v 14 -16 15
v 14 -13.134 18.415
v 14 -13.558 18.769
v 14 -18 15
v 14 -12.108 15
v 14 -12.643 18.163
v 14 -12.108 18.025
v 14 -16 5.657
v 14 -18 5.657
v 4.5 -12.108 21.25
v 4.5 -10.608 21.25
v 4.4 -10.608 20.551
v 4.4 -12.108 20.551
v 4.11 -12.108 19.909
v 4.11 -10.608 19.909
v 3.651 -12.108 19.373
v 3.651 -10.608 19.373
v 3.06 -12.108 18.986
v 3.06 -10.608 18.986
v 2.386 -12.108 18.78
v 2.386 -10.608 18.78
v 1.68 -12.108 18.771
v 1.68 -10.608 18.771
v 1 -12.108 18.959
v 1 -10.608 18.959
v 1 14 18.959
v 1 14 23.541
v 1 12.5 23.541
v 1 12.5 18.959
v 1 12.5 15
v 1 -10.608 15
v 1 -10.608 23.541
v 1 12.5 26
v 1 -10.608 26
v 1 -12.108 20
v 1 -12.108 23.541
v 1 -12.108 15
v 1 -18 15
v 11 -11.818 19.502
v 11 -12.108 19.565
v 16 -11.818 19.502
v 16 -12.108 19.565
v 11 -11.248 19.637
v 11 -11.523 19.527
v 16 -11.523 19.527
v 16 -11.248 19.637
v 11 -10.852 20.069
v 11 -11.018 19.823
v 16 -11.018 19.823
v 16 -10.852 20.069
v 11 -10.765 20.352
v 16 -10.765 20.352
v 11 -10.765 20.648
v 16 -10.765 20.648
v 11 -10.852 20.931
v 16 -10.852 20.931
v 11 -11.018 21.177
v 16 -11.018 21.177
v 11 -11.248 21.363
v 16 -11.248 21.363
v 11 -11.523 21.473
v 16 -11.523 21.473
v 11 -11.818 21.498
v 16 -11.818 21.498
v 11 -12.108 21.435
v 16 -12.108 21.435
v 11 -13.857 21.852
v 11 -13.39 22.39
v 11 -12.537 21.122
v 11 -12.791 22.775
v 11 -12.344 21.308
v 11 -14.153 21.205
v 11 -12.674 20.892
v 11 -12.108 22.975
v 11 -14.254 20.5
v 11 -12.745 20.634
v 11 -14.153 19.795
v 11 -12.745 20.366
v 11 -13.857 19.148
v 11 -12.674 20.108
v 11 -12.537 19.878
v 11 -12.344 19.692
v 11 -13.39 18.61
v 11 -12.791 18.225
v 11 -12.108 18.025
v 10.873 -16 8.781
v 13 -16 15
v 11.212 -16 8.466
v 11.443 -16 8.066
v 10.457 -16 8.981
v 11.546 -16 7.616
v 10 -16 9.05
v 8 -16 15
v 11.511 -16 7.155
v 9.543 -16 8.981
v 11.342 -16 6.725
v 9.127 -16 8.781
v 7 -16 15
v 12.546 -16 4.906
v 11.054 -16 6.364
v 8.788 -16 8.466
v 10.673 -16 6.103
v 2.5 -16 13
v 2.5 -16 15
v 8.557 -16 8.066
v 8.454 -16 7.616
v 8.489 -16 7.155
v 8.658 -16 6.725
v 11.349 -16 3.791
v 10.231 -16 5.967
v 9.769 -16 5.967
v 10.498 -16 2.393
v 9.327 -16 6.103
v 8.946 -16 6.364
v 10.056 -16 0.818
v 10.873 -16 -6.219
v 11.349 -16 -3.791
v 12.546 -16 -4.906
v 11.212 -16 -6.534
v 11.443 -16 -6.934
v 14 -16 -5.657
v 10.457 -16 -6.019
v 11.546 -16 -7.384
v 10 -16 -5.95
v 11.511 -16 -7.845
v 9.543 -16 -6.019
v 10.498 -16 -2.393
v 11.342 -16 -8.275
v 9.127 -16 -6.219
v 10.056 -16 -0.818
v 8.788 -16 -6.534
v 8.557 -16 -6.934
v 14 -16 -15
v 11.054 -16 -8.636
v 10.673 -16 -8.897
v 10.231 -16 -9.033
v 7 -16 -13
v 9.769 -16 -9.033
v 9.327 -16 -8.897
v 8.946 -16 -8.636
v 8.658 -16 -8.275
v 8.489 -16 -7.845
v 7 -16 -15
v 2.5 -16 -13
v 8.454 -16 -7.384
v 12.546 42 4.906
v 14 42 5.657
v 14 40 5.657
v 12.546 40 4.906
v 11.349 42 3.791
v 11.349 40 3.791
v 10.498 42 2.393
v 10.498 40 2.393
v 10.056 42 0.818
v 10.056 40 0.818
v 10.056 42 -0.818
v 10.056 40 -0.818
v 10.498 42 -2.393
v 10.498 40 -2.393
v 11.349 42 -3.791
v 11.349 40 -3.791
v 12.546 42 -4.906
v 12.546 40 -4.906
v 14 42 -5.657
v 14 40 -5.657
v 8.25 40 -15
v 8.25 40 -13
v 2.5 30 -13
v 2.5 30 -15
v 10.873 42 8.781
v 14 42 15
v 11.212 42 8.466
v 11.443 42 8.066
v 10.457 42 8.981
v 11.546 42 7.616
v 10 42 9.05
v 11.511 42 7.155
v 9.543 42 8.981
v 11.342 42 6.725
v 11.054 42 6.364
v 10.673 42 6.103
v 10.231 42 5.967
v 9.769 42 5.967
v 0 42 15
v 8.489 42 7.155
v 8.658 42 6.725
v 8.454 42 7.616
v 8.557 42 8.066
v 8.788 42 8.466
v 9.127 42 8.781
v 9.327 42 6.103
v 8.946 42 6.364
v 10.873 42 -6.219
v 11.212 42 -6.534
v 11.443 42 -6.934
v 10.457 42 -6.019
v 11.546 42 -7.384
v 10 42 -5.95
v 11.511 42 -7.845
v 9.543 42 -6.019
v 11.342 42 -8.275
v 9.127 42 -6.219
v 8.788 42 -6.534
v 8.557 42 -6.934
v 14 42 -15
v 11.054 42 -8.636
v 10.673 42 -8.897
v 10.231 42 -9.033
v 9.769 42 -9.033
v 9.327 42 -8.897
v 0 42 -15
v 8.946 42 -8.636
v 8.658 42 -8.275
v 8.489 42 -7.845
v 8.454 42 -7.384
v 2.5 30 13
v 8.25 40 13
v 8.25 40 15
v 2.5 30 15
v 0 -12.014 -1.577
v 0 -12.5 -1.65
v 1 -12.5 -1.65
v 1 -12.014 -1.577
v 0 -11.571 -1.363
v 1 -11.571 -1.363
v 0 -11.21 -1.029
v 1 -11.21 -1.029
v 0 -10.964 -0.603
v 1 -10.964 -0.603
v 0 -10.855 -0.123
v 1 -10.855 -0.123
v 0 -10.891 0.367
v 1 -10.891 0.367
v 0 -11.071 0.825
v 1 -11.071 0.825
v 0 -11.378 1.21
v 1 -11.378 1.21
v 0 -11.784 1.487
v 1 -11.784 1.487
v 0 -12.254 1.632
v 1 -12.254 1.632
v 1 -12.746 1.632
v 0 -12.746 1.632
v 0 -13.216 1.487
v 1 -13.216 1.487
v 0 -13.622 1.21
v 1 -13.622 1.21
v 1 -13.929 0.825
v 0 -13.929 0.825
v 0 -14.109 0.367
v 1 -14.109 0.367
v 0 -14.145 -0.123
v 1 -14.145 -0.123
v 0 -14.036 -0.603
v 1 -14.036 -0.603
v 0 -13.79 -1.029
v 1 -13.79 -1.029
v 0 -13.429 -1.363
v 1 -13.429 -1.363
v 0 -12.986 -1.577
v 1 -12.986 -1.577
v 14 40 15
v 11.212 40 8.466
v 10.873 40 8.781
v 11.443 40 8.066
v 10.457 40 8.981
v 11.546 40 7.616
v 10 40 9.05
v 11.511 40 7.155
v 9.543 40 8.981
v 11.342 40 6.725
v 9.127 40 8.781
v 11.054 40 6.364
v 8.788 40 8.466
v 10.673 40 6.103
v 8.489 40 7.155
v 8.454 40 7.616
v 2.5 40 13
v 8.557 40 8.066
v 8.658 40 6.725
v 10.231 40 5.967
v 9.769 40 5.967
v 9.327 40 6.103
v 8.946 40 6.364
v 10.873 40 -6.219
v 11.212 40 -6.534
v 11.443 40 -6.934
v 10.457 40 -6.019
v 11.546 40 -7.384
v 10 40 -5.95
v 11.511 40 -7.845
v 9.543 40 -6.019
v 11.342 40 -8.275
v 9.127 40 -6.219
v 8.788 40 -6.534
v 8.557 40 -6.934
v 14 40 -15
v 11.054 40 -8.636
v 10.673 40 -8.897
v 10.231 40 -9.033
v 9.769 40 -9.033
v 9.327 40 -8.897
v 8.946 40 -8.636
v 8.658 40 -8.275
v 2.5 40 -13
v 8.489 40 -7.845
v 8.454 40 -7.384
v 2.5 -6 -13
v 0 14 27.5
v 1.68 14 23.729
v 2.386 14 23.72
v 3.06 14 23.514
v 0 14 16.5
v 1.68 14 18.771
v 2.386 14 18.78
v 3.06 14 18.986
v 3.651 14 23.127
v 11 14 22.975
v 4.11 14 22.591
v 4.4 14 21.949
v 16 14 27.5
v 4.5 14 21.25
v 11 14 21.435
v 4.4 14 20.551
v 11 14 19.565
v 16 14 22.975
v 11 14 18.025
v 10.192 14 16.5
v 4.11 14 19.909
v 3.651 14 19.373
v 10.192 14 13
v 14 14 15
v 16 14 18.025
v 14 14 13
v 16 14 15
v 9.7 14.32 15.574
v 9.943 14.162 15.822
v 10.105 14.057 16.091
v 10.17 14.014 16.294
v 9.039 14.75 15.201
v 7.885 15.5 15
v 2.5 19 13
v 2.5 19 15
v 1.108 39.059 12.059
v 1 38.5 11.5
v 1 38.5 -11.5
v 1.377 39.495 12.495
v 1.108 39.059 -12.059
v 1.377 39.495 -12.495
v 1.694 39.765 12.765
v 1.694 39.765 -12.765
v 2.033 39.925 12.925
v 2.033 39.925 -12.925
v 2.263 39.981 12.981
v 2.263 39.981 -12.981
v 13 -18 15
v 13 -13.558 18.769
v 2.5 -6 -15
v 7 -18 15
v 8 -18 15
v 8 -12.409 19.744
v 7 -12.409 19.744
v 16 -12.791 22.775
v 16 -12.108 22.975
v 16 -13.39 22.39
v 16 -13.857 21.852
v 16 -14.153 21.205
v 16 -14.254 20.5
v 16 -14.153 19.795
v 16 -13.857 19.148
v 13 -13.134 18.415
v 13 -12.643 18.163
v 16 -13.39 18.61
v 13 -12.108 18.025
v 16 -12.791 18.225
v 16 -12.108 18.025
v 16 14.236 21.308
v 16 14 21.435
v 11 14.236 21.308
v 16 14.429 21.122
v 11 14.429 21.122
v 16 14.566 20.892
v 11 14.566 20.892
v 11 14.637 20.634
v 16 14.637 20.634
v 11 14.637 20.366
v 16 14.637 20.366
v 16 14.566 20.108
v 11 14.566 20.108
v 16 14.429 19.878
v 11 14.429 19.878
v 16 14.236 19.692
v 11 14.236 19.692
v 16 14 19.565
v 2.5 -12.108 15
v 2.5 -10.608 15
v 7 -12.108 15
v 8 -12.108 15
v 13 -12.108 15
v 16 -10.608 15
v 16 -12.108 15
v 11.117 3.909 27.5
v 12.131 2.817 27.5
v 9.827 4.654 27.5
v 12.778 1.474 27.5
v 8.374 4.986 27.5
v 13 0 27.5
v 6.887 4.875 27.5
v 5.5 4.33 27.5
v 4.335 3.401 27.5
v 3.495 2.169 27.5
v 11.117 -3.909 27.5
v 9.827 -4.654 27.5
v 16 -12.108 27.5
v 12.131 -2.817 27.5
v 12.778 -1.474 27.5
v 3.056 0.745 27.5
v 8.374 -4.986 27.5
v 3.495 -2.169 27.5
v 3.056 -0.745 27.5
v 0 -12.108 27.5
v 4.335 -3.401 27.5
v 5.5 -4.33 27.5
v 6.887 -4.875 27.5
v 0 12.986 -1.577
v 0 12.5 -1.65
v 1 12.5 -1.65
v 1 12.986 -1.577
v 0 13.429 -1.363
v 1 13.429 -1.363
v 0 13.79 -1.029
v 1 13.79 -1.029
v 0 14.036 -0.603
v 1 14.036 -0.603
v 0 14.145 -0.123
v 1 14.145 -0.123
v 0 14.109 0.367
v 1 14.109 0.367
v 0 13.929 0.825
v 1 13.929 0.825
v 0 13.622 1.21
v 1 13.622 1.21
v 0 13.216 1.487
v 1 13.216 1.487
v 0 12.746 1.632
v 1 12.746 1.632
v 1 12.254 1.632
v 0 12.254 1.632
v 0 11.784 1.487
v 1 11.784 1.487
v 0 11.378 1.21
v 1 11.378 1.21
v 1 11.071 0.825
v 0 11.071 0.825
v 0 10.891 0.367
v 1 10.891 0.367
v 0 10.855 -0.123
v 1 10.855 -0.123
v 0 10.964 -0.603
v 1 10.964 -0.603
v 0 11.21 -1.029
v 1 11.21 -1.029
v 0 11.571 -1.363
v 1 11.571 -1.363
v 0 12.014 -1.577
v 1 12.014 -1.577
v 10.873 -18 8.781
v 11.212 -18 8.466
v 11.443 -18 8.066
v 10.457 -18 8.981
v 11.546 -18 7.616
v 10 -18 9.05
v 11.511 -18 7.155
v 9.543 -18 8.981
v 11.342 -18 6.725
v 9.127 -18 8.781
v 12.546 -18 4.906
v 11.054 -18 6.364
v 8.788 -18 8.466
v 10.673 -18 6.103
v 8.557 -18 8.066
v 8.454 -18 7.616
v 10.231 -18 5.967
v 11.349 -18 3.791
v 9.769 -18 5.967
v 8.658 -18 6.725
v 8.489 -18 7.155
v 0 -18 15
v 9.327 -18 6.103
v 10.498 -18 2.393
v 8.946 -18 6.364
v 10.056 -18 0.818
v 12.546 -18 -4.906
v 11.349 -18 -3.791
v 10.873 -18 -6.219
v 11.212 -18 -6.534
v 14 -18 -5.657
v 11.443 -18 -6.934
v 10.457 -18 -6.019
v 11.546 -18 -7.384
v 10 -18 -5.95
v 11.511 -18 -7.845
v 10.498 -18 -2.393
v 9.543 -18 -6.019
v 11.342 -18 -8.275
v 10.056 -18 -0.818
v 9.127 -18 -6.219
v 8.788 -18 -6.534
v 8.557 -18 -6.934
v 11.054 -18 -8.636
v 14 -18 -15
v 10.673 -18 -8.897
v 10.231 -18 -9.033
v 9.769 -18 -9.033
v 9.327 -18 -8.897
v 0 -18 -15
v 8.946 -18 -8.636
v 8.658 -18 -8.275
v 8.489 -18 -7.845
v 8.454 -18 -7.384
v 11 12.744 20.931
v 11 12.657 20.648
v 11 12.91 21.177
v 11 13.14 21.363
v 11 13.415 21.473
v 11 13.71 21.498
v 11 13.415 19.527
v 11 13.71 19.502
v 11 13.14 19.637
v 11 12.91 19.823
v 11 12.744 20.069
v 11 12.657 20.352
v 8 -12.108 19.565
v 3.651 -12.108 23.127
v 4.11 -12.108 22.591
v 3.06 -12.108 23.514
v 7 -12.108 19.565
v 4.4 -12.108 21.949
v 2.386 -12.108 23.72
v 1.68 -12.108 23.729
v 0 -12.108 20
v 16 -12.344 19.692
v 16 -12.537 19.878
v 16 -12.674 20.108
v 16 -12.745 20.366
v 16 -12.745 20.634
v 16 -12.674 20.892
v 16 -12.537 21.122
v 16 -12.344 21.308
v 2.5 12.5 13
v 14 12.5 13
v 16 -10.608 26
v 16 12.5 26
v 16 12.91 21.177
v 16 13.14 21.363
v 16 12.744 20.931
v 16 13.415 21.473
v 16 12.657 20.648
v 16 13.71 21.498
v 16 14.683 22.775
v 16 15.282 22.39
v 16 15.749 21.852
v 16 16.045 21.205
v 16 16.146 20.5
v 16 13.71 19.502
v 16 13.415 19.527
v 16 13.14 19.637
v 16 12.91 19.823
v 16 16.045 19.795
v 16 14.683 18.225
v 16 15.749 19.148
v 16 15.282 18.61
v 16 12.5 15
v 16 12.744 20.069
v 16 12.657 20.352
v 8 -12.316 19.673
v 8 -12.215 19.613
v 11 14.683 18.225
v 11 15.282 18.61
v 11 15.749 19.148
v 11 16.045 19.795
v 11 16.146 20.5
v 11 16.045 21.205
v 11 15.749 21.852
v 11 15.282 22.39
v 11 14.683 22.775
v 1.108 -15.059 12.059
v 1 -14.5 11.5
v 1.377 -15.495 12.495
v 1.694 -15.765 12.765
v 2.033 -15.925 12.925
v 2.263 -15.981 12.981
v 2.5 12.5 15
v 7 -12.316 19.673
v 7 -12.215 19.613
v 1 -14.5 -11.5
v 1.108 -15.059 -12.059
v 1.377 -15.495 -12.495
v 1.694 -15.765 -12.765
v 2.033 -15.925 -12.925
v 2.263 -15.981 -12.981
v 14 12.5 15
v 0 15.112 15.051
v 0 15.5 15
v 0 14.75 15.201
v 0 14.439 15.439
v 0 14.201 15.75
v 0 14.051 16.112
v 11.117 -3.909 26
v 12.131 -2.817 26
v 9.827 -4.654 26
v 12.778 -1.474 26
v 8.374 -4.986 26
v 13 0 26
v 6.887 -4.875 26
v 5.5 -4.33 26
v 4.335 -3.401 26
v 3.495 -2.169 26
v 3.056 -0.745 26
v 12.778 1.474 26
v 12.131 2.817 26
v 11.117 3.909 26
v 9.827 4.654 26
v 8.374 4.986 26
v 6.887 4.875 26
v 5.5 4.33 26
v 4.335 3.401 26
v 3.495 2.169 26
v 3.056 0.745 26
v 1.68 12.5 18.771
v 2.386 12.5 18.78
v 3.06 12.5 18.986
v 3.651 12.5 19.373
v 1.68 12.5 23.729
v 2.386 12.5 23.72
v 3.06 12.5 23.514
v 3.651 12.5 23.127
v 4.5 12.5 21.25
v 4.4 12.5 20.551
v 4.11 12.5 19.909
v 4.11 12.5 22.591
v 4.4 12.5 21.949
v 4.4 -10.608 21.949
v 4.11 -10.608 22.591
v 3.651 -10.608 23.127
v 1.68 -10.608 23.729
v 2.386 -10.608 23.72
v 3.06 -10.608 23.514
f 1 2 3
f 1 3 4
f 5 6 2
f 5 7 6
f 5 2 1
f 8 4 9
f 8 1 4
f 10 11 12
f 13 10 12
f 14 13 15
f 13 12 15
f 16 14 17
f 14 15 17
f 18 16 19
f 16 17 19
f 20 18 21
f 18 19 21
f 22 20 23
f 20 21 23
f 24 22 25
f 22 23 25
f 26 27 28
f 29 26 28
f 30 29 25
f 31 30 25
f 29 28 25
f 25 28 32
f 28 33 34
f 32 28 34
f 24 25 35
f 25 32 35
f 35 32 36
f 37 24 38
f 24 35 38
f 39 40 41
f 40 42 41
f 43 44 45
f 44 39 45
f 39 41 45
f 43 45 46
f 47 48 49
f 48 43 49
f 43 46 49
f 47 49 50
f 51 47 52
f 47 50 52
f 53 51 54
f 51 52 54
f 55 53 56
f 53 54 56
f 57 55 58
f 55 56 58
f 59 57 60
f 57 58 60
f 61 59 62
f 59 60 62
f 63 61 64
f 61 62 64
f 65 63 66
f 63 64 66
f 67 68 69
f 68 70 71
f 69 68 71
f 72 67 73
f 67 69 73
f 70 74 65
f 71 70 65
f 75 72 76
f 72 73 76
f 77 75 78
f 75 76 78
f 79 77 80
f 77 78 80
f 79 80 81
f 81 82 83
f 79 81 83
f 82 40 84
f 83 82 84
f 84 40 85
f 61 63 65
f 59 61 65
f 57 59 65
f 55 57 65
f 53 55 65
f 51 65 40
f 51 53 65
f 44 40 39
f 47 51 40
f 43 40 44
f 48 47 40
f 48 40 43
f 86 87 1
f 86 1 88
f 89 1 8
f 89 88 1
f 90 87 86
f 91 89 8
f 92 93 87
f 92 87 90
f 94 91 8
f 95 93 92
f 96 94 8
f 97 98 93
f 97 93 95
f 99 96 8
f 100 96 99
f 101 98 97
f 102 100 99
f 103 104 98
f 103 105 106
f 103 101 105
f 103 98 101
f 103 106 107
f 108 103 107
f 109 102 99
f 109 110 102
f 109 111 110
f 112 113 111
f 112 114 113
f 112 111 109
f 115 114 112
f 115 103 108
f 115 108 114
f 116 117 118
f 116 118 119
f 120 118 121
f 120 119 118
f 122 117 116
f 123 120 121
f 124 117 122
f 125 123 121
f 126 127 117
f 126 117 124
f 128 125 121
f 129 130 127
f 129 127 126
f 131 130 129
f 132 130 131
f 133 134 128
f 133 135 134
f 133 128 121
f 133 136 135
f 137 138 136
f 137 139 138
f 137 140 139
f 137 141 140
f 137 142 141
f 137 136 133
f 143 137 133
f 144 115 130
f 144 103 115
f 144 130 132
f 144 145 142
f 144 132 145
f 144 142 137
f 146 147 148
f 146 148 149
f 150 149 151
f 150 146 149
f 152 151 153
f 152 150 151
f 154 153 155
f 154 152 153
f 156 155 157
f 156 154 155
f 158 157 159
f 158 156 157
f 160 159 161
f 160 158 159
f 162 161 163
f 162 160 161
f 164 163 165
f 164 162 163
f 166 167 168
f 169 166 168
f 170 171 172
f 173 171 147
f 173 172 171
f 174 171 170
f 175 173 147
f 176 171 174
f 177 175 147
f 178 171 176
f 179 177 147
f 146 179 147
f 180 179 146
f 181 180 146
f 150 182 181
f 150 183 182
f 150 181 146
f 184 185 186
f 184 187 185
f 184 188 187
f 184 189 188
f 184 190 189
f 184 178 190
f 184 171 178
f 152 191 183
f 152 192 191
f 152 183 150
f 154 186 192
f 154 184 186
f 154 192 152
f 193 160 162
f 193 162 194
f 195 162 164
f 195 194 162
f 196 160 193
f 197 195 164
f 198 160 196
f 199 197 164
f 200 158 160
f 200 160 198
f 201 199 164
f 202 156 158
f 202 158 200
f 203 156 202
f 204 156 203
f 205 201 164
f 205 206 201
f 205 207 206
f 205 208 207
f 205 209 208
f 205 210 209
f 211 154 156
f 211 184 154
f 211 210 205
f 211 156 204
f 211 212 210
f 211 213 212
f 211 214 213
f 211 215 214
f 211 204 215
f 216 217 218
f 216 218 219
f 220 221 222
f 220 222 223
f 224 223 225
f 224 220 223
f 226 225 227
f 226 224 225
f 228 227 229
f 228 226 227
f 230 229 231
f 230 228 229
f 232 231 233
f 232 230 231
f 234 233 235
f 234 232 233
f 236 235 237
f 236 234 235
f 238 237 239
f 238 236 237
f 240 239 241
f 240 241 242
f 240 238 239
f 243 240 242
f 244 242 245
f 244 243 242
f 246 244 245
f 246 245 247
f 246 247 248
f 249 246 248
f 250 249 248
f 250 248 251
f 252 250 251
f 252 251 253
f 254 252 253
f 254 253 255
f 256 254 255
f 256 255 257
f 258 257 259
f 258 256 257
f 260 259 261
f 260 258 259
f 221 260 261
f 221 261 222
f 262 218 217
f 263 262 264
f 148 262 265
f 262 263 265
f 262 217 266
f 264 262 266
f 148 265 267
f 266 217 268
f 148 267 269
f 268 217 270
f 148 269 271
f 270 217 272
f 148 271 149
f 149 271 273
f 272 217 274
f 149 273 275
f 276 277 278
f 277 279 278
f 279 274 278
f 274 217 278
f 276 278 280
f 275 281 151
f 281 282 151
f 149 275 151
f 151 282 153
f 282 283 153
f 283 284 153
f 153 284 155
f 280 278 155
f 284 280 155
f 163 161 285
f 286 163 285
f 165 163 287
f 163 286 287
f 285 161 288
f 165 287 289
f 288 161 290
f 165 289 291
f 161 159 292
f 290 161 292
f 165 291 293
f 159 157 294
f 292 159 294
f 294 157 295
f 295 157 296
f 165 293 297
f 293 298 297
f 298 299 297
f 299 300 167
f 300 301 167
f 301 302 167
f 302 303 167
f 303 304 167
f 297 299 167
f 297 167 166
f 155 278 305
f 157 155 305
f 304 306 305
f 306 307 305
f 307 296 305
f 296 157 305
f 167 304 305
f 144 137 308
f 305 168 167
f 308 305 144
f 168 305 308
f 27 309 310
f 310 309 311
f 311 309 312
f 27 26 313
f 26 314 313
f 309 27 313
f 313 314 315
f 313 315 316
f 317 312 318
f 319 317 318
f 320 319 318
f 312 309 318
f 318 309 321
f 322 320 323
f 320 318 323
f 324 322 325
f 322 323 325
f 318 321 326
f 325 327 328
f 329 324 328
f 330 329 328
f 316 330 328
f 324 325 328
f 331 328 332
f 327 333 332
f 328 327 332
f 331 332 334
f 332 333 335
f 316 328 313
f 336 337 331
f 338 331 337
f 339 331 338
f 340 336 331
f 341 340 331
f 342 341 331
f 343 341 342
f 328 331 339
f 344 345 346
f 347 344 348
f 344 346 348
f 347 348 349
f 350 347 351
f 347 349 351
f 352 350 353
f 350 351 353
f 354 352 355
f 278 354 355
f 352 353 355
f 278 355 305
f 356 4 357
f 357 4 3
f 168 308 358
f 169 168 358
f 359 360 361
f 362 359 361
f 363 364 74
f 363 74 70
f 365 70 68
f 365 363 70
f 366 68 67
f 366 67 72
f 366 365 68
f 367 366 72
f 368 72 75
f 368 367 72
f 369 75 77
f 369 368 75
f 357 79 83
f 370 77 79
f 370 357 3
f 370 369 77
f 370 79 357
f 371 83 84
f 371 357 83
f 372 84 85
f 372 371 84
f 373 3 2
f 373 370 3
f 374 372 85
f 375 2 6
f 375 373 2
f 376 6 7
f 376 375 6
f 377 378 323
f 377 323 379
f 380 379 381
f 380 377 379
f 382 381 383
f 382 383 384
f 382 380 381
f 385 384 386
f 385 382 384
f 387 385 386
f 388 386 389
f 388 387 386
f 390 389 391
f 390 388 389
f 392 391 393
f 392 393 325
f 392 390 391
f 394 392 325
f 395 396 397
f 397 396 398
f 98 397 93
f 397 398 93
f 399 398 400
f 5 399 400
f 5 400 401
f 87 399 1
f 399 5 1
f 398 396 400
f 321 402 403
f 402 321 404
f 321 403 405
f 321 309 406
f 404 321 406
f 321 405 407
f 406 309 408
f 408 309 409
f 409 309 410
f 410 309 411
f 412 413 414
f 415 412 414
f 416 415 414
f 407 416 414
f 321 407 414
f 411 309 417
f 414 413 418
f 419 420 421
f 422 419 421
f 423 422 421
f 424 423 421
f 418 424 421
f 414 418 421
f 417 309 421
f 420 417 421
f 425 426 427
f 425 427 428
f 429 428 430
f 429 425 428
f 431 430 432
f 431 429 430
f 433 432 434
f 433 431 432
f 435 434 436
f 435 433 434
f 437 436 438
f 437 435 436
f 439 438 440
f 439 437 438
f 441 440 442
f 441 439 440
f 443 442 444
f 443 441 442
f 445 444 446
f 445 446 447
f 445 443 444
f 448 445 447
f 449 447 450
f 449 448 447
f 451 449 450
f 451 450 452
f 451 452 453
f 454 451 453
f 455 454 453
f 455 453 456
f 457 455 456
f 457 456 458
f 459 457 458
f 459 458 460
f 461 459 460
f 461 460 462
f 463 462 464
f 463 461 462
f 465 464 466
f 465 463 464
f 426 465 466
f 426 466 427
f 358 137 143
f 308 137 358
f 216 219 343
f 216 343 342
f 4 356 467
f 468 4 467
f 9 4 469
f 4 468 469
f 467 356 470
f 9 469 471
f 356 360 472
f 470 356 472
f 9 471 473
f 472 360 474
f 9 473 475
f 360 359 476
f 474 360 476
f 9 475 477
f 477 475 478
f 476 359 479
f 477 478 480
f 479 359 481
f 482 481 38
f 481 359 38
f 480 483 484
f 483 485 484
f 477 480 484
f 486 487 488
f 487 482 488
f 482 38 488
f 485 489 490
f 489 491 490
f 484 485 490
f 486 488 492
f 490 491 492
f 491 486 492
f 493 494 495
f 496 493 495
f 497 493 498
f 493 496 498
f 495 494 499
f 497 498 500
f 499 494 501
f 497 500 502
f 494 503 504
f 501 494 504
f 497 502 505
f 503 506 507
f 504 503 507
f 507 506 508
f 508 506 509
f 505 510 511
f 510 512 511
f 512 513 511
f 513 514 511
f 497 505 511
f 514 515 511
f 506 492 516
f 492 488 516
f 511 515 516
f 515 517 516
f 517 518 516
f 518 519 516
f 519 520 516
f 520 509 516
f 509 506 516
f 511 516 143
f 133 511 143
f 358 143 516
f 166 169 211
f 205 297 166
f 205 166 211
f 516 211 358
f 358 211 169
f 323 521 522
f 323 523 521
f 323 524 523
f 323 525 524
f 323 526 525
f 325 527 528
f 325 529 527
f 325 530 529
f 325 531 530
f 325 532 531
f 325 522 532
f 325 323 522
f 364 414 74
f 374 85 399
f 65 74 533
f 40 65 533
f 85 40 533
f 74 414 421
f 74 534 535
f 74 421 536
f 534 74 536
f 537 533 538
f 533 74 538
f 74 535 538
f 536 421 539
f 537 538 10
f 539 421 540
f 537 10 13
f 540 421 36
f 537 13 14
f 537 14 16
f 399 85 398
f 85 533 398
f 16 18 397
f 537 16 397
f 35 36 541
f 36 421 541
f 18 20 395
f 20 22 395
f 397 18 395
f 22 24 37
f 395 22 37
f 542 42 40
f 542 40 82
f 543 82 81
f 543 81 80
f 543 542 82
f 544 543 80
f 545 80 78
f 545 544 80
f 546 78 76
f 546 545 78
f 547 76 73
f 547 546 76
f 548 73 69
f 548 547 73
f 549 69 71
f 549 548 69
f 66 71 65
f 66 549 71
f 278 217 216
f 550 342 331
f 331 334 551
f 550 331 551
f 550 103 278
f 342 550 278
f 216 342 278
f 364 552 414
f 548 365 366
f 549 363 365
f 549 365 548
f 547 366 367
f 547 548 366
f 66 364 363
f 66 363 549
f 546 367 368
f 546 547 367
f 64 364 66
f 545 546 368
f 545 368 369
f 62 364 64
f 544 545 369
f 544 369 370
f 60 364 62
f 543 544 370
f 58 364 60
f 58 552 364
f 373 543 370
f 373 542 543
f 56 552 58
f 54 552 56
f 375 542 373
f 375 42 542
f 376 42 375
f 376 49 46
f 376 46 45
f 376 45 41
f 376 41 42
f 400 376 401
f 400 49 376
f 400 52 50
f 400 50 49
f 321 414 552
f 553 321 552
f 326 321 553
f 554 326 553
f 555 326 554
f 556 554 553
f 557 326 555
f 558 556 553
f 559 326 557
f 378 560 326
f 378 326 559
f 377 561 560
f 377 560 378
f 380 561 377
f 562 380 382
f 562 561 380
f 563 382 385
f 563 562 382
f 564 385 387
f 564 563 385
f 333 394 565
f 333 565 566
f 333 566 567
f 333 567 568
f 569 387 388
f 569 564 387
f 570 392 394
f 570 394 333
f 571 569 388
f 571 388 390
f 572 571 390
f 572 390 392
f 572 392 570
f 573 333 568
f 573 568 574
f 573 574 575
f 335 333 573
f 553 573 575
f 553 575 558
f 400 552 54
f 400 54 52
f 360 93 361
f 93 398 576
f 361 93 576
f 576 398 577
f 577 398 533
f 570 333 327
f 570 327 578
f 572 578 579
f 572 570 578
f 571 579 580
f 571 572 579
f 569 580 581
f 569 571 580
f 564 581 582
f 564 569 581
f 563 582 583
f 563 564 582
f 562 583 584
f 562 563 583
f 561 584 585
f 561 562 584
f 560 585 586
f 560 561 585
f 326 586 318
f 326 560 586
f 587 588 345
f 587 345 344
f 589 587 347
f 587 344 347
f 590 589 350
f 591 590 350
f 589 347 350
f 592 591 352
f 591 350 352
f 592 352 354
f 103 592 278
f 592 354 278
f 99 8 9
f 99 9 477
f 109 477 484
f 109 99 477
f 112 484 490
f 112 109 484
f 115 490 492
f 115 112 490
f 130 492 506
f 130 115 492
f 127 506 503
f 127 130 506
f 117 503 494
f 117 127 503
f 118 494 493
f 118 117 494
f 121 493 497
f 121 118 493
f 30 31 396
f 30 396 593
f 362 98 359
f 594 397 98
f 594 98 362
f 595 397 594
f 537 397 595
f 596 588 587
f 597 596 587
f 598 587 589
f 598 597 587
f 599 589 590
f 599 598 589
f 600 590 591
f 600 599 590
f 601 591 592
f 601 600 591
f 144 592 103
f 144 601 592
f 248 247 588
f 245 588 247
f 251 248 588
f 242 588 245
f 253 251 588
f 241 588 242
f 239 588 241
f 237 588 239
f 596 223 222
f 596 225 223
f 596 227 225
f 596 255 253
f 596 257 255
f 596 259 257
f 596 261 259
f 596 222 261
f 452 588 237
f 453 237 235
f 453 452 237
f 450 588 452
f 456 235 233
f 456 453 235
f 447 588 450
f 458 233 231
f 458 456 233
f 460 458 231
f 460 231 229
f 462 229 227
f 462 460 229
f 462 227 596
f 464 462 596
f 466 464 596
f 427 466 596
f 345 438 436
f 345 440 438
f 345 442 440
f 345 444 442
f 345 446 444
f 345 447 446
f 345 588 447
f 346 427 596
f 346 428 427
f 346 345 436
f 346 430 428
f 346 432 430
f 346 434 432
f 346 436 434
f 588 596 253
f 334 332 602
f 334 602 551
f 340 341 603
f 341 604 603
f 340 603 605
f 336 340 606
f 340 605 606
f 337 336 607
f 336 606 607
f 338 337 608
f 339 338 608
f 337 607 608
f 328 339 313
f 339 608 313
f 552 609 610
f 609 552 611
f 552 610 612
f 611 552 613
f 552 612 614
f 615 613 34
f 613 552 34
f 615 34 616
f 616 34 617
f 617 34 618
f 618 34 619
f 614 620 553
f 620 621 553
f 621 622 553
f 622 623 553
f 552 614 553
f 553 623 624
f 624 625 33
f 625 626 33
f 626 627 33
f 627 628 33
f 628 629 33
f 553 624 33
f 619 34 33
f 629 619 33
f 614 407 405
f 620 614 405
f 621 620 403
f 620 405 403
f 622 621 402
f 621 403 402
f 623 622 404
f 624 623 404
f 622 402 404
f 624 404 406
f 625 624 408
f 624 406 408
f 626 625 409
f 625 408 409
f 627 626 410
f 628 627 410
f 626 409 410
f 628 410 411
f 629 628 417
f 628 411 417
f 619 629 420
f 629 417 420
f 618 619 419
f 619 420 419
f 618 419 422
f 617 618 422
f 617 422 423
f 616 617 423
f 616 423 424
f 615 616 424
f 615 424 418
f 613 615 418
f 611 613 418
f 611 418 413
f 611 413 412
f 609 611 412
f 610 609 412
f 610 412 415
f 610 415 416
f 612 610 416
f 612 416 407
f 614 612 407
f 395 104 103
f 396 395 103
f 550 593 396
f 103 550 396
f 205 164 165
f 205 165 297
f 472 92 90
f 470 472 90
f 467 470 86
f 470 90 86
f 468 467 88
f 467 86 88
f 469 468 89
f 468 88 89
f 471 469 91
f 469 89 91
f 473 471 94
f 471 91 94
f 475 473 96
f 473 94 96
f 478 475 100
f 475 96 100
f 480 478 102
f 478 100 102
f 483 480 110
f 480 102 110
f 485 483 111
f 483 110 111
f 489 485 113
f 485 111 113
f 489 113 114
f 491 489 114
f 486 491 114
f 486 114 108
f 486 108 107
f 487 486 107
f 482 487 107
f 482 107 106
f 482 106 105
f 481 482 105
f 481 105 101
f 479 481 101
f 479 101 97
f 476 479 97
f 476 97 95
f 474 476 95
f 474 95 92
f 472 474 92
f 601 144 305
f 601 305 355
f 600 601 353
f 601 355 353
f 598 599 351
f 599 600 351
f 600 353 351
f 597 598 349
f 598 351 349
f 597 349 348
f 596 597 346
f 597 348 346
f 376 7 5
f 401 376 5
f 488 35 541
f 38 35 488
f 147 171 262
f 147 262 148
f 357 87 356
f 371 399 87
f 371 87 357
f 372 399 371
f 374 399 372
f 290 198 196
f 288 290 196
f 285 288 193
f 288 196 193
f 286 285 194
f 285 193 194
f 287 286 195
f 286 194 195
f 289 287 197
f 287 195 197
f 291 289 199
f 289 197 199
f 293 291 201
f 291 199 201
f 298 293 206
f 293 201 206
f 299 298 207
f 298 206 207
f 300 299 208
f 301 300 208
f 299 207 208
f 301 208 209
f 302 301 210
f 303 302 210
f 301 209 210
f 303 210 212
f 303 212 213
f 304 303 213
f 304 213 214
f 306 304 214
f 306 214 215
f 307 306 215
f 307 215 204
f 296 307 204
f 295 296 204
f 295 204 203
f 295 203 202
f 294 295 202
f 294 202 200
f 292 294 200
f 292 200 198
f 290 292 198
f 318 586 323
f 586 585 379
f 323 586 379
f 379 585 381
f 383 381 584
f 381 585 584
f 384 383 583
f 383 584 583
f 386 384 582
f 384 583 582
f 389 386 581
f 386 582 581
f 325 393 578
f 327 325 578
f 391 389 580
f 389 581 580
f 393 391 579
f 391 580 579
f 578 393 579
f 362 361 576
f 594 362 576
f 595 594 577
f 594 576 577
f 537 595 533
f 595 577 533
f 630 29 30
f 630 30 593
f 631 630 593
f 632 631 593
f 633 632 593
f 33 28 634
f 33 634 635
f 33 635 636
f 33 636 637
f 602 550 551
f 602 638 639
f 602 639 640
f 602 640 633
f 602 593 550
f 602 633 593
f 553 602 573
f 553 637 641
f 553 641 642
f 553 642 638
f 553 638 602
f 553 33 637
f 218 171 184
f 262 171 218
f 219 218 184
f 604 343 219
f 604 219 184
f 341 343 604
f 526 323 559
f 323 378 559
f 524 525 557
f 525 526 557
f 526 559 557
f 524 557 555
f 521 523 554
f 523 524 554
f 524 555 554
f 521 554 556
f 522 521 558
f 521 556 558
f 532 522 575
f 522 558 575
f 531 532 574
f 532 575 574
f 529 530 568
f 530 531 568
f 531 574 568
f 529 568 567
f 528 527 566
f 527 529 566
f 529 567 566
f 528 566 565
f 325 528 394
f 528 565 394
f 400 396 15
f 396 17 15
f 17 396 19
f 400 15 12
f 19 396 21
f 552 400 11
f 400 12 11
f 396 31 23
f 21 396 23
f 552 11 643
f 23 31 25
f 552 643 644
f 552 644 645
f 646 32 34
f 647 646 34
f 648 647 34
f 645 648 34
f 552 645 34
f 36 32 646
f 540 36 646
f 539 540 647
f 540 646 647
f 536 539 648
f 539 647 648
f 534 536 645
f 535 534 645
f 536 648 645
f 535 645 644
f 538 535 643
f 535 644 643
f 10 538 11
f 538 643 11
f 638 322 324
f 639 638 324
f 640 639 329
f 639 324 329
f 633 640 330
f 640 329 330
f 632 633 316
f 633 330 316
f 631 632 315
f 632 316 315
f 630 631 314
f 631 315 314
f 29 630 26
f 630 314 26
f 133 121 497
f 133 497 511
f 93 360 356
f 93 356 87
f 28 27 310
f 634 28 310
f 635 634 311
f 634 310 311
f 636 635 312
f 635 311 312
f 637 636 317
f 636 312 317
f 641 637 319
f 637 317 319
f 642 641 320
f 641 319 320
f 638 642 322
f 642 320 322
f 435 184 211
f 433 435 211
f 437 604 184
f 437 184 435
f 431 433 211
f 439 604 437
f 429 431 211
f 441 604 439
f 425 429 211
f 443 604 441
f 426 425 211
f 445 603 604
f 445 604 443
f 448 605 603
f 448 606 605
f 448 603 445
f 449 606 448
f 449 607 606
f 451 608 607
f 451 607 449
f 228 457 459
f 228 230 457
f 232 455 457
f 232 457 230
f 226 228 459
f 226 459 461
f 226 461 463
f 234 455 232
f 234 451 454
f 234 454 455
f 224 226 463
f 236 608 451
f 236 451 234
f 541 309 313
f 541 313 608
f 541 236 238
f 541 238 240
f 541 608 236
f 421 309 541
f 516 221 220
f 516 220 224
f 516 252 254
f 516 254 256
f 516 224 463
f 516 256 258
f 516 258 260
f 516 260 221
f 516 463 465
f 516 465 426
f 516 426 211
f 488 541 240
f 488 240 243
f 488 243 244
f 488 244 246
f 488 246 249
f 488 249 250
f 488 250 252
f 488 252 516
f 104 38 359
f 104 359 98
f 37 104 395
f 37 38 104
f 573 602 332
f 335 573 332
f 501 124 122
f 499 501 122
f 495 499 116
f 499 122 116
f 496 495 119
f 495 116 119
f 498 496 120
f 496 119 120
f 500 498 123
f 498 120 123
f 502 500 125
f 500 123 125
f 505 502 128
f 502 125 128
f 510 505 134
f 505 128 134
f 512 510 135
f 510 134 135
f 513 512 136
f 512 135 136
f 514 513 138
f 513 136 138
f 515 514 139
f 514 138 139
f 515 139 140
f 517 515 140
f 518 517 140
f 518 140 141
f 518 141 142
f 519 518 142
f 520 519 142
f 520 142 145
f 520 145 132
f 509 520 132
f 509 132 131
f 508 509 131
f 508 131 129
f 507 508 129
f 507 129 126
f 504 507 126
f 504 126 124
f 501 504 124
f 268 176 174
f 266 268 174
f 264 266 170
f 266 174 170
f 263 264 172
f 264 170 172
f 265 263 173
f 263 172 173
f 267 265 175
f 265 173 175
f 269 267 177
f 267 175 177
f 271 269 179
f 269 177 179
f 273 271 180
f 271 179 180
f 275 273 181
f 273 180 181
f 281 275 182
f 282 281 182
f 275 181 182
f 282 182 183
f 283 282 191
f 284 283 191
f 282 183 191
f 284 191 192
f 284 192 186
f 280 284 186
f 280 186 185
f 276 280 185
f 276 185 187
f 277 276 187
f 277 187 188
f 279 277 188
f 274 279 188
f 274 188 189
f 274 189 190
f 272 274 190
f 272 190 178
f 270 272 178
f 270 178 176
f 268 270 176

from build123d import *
from build123d.topology import SkipClean

# Parameters (mm, degrees)
CROQUIS1_R               = 1.65
SALIENTE_EXTRUIR1_DEPTH  = 1
CROQUIS3_W               = 30
CROQUIS3_H               = 2
SALIENTE_EXTRUIR2_DEPTH  = 13
CROQUIS4_R               = 1.55
CORTAR_EXTRUIR1_DEPTH    = 64.41135545
CROQUIS8_W               = 11
CROQUIS8_H               = 23.108
SALIENTE_EXTRUIR4_DEPTH  = 1
SALIENTE_EXTRUIR5_DEPTH  = 16
CORTAR_EXTRUIR2_DEPTH    = 46.124826869
SALIENTE_EXTRUIR6_DEPTH  = 5
CROQUIS12_R              = 1
CORTAR_EXTRUIR3_DEPTH    = 5
CROQUIS13_W              = 2
CROQUIS13_H              = 56
SALIENTE_EXTRUIR7_DEPTH  = 1.5
SALIENTE_EXTRUIR8_DEPTH  = 2
CROQUIS15_W              = 2
CROQUIS15_H              = 1.5
SALIENTE_EXTRUIR9_DEPTH  = 5
NERVIO4_REACH            = 54.69
CROQUIS16_WALL_W         = 115.107854894
CROQUIS16_WALL_H         = 1
NERVIO5_REACH            = 56.037
CROQUIS17_WALL_W         = 121.609320684
CROQUIS17_WALL_H         = 2
SALIENTE_EXTRUIR10_DEPTH = 1
MATRIZL1_COUNT           = 2
MATRIZL1_PITCH           = 6
NERVIO9_REACH            = 63.857
CROQUIS19_WALL_W         = 137.248650414
CROQUIS19_WALL_H         = 2
NERVIO10_REACH           = 63.857
CROQUIS20_WALL_W         = 136.67923452
CROQUIS20_WALL_H         = 2
REDONDEO1_R              = 1.5
CROQUIS21_R              = 5
CORTAR_EXTRUIR4_DEPTH    = 2


with BuildPart() as part:
    # Croquis1 → Saliente-Extruir1 (new body)
    with BuildSketch(Plane(origin=(0, 0, 0), x_dir=(0, 0, -1), z_dir=(1, 0, 0))):
        Polygon((-15, 18), (-15, -18), (15, -18), (15, 18), (15, 42), (-15, 42), align=None)
        with Locations((0, 12.5)):
            Circle(CROQUIS1_R, mode=Mode.SUBTRACT)
        with Locations((0, -12.5)):
            Circle(CROQUIS1_R, mode=Mode.SUBTRACT)
    extrude(amount=SALIENTE_EXTRUIR1_DEPTH)

    # Croquis3 → Saliente-Extruir2 (add)
    with BuildSketch(Plane(origin=(1, 0, 0), x_dir=(0, 0, -1), z_dir=(1, 0, 0))):
        with Locations((0, 41)):
            Rectangle(CROQUIS3_W, CROQUIS3_H)
        with Locations((0, -17)):
            Rectangle(CROQUIS3_W, CROQUIS3_H)
    extrude(amount=SALIENTE_EXTRUIR2_DEPTH)

    # Croquis4 → Cortar-Extruir1 (cut, through all)
    with BuildSketch(Plane(origin=(0, 42, 0), x_dir=(1, 0, 0), z_dir=(0, 1, 0))):
        with Locations(Location((10, 7.5, 0), (0, 0, 270))):
            Circle(CROQUIS4_R)
        with Locations(Location((10, -7.5, 0), (0, 0, 270))):
            Circle(CROQUIS4_R)
        with BuildLine():
            Line((14, 5.656854249), (14, -5.656854249))
            ThreePointArc((14, -5.656854249), (10, 0), (14, 5.656854249))
        make_face()
    extrude(amount=-CORTAR_EXTRUIR1_DEPTH, mode=Mode.SUBTRACT)

    # Croquis8 → Saliente-Extruir4 (add)
    with BuildSketch(Plane(origin=(0, 0, 0), x_dir=(0, 0, -1), z_dir=(1, 0, 0))):
        with Locations((-20.5, 0.946)):
            Rectangle(CROQUIS8_W, CROQUIS8_H)
    extrude(amount=SALIENTE_EXTRUIR4_DEPTH)

    # Croquis9 → Saliente-Extruir5 (add)
    with BuildSketch(Plane(origin=(0, 0, 0), x_dir=(0, 0, -1), z_dir=(1, 0, 0))):
        Polygon((-26, -10.608), (-26, 12.5), (-15, 12.5), (-15, 14), (-27.5, 14), (-27.5, -12.108), (-15, -12.108), (-15, -10.608), align=None)
    extrude(amount=SALIENTE_EXTRUIR5_DEPTH)

    # Croquis10 → Cortar-Extruir2 (cut, through all)
    with BuildSketch(Plane(origin=(0, 14, 0), x_dir=(1, 0, 0), z_dir=(0, 1, 0))):
        with BuildLine():
            ThreePointArc((4.5, -21.25), (3.369306394, -19.158349934), (1, -18.958712153))
            Line((1, -18.958712153), (1, -23.541287847))
            ThreePointArc((1, -23.541287847), (3.369306394, -23.341650066), (4.5, -21.25))
        make_face()
    extrude(amount=-CORTAR_EXTRUIR2_DEPTH, mode=Mode.SUBTRACT)

    # Croquis11 → Saliente-Extruir6 (add)
    with BuildSketch(Plane(origin=(16, 0, 0), x_dir=(0, 0, -1), z_dir=(1, 0, 0))):
        with BuildLine():
            Line((-21.435245422, -12.108), (-22.974809892, -12.108))
            ThreePointArc((-22.974809892, -12.108), (-20.5, -14.254), (-18.025190108, -12.108))
            Line((-18.025190108, -12.108), (-19.564754578, -12.108))
            ThreePointArc((-19.564754578, -12.108), (-20.5, -12.754), (-21.435245422, -12.108))
        make_face()
        with BuildLine():
            ThreePointArc((-18.025190108, 14), (-20.5, 16.146), (-22.974809892, 14))
            Line((-22.974809892, 14), (-21.435245422, 14))
            ThreePointArc((-21.435245422, 14), (-20.5, 14.646), (-19.564754578, 14))
            Line((-19.564754578, 14), (-18.025190108, 14))
        make_face()
    extrude(amount=-SALIENTE_EXTRUIR6_DEPTH)

    # Croquis12 → Cortar-Extruir3 (cut)
    with BuildSketch(Plane(origin=(16, 0, 0), x_dir=(0, 0, -1), z_dir=(1, 0, 0))):
        with Locations((-20.5, -11.754)):
            Circle(CROQUIS12_R)
        with Locations((-20.5, 13.646)):
            Circle(CROQUIS12_R)
    extrude(amount=-CORTAR_EXTRUIR3_DEPTH, mode=Mode.SUBTRACT)

    # Croquis13 → Saliente-Extruir7 (add)
    with BuildSketch(Plane(origin=(1, 0, 0), x_dir=(0, 0, -1), z_dir=(1, 0, 0))):
        with Locations((-14, 12)):
            Rectangle(CROQUIS13_W, CROQUIS13_H)
        with Locations((14, 12)):
            Rectangle(CROQUIS13_W, CROQUIS13_H)
    extrude(amount=SALIENTE_EXTRUIR7_DEPTH)

    # Croquis14 → Saliente-Extruir8 (add)
    with BuildSketch(Plane(origin=(0, 0, 15), x_dir=(-1, 0, 0), z_dir=(0, 0, -1))):
        Polygon((-12.5, 12.5), (-2.5, 19), (-2.5, 12.5), align=None)
    extrude(amount=SALIENTE_EXTRUIR8_DEPTH)

    # Croquis15 → Saliente-Extruir9 (add)
    with BuildSketch(Plane(origin=(14, 0, 0), x_dir=(0, 0, -1), z_dir=(1, 0, 0))):
        with Locations((-14, 13.25)):
            Rectangle(CROQUIS15_W, CROQUIS15_H)
    extrude(amount=-SALIENTE_EXTRUIR9_DEPTH)

    # Croquis16 wall → Nervio4 (add, up to next)
    with BuildSketch(Plane(origin=(0, -15.054, 17.5), x_dir=(0, -0.76246270462, -0.647032166174), z_dir=(0, -0.647032166174, 0.76246270462)), mode=Mode.PRIVATE) as nervio4_sk1:
        with Locations((0, 0.5)):
            Rectangle(CROQUIS16_WALL_W, CROQUIS16_WALL_H)
    nervio4_tool1 = extrude(nervio4_sk1.sketch, amount=-NERVIO4_REACH, mode=Mode.PRIVATE) - part.part
    add(nervio4_tool1.solids().sort_by_distance((0, -15.054, 17.5))[0])

    # Croquis17 wall → Nervio5 (add, up to next)
    with BuildSketch(Plane(origin=(5.375, 35, 15), x_dir=(-0.498471124258, -0.866906303058, 0), z_dir=(0.866906303058, -0.498471124258, 0)), mode=Mode.PRIVATE) as nervio5_sk1:
        with Locations((0, 1)):
            Rectangle(CROQUIS17_WALL_W, CROQUIS17_WALL_H)
    nervio5_tool1 = extrude(nervio5_sk1.sketch, amount=-NERVIO5_REACH, mode=Mode.PRIVATE) - part.part
    add(nervio5_tool1.solids().sort_by_distance((5.375, 35, 15))[0])

    # Croquis18 → Saliente-Extruir10 (add)
    with SkipClean():  # the faces are left unmerged after this step: merging them gives an invalid solid
        with BuildSketch(Plane(origin=(14, 0, 0), x_dir=(0, 0, -1), z_dir=(1, 0, 0))):
            with BuildLine():
                Line((-15, -18), (-19.744471073, -12.409115288))
                ThreePointArc((-19.744471073, -12.409115288), (-19.641310837, -12.266496752), (-19.564754578, -12.108))
                Line((-19.564754578, -12.108), (-15, -12.108))
                Line((-15, -12.108), (-15, -18))
            make_face()
        saliente_extruir10 = extrude(amount=-SALIENTE_EXTRUIR10_DEPTH)

    # MatrizL1: Saliente-Extruir10 ×2
    with SkipClean():  # the faces are left unmerged after this step: merging them gives an invalid solid
        with Locations(*[(-i * MATRIZL1_PITCH, 0, 0) for i in range(1, MATRIZL1_COUNT)]):
            add(saliente_extruir10)

    # Croquis19 wall → Nervio9 (add, up to next)
    with BuildSketch(Plane(origin=(5.375, 35, -15), x_dir=(-0.498471124258, -0.866906303058, 0), z_dir=(-0.866906303058, 0.498471124258, 0)), mode=Mode.PRIVATE) as nervio9_sk1:
        with Locations((0, 1)):
            Rectangle(CROQUIS19_WALL_W, CROQUIS19_WALL_H)
    nervio9_tool1 = extrude(nervio9_sk1.sketch, amount=NERVIO9_REACH, mode=Mode.PRIVATE) - part.part
    add(nervio9_tool1.solids().sort_by_distance((5.375, 35, -15))[0])

    # Croquis20 wall → Nervio10 (add, up to next)
    with BuildSketch(Plane(origin=(4.75, -11, -15), x_dir=(-0.410364677329, 0.911921505175, 0), z_dir=(0.911921505175, 0.410364677329, 0)), mode=Mode.PRIVATE) as nervio10_sk1:
        with Locations((0, 1)):
            Rectangle(CROQUIS20_WALL_W, CROQUIS20_WALL_H)
    nervio10_tool1 = extrude(nervio10_sk1.sketch, amount=-NERVIO10_REACH, mode=Mode.PRIVATE) - part.part
    add(nervio10_tool1.solids().sort_by_distance((4.75, -11, -15))[0])

    # Redondeo1
    redondeo1_edges = [part.edges().sort_by_distance(p)[0] for p in [
        (5.096153846, 14, 15),
        (1, 40, 0),
        (1, 12, 13),
        (1, -16, 0),
        (1, 12, -13),
    ]]
    fillet(redondeo1_edges, radius=REDONDEO1_R - 0.0001)  # a hair under: the kernel refuses the full size

    # Croquis21 → Cortar-Extruir4 (cut)
    with BuildSketch(Plane.XY.offset(27.5)):
        with Locations((8, 0)):
            Circle(CROQUIS21_R)
    extrude(amount=-CORTAR_EXTRUIR4_DEPTH, mode=Mode.SUBTRACT)


solid = part.part
